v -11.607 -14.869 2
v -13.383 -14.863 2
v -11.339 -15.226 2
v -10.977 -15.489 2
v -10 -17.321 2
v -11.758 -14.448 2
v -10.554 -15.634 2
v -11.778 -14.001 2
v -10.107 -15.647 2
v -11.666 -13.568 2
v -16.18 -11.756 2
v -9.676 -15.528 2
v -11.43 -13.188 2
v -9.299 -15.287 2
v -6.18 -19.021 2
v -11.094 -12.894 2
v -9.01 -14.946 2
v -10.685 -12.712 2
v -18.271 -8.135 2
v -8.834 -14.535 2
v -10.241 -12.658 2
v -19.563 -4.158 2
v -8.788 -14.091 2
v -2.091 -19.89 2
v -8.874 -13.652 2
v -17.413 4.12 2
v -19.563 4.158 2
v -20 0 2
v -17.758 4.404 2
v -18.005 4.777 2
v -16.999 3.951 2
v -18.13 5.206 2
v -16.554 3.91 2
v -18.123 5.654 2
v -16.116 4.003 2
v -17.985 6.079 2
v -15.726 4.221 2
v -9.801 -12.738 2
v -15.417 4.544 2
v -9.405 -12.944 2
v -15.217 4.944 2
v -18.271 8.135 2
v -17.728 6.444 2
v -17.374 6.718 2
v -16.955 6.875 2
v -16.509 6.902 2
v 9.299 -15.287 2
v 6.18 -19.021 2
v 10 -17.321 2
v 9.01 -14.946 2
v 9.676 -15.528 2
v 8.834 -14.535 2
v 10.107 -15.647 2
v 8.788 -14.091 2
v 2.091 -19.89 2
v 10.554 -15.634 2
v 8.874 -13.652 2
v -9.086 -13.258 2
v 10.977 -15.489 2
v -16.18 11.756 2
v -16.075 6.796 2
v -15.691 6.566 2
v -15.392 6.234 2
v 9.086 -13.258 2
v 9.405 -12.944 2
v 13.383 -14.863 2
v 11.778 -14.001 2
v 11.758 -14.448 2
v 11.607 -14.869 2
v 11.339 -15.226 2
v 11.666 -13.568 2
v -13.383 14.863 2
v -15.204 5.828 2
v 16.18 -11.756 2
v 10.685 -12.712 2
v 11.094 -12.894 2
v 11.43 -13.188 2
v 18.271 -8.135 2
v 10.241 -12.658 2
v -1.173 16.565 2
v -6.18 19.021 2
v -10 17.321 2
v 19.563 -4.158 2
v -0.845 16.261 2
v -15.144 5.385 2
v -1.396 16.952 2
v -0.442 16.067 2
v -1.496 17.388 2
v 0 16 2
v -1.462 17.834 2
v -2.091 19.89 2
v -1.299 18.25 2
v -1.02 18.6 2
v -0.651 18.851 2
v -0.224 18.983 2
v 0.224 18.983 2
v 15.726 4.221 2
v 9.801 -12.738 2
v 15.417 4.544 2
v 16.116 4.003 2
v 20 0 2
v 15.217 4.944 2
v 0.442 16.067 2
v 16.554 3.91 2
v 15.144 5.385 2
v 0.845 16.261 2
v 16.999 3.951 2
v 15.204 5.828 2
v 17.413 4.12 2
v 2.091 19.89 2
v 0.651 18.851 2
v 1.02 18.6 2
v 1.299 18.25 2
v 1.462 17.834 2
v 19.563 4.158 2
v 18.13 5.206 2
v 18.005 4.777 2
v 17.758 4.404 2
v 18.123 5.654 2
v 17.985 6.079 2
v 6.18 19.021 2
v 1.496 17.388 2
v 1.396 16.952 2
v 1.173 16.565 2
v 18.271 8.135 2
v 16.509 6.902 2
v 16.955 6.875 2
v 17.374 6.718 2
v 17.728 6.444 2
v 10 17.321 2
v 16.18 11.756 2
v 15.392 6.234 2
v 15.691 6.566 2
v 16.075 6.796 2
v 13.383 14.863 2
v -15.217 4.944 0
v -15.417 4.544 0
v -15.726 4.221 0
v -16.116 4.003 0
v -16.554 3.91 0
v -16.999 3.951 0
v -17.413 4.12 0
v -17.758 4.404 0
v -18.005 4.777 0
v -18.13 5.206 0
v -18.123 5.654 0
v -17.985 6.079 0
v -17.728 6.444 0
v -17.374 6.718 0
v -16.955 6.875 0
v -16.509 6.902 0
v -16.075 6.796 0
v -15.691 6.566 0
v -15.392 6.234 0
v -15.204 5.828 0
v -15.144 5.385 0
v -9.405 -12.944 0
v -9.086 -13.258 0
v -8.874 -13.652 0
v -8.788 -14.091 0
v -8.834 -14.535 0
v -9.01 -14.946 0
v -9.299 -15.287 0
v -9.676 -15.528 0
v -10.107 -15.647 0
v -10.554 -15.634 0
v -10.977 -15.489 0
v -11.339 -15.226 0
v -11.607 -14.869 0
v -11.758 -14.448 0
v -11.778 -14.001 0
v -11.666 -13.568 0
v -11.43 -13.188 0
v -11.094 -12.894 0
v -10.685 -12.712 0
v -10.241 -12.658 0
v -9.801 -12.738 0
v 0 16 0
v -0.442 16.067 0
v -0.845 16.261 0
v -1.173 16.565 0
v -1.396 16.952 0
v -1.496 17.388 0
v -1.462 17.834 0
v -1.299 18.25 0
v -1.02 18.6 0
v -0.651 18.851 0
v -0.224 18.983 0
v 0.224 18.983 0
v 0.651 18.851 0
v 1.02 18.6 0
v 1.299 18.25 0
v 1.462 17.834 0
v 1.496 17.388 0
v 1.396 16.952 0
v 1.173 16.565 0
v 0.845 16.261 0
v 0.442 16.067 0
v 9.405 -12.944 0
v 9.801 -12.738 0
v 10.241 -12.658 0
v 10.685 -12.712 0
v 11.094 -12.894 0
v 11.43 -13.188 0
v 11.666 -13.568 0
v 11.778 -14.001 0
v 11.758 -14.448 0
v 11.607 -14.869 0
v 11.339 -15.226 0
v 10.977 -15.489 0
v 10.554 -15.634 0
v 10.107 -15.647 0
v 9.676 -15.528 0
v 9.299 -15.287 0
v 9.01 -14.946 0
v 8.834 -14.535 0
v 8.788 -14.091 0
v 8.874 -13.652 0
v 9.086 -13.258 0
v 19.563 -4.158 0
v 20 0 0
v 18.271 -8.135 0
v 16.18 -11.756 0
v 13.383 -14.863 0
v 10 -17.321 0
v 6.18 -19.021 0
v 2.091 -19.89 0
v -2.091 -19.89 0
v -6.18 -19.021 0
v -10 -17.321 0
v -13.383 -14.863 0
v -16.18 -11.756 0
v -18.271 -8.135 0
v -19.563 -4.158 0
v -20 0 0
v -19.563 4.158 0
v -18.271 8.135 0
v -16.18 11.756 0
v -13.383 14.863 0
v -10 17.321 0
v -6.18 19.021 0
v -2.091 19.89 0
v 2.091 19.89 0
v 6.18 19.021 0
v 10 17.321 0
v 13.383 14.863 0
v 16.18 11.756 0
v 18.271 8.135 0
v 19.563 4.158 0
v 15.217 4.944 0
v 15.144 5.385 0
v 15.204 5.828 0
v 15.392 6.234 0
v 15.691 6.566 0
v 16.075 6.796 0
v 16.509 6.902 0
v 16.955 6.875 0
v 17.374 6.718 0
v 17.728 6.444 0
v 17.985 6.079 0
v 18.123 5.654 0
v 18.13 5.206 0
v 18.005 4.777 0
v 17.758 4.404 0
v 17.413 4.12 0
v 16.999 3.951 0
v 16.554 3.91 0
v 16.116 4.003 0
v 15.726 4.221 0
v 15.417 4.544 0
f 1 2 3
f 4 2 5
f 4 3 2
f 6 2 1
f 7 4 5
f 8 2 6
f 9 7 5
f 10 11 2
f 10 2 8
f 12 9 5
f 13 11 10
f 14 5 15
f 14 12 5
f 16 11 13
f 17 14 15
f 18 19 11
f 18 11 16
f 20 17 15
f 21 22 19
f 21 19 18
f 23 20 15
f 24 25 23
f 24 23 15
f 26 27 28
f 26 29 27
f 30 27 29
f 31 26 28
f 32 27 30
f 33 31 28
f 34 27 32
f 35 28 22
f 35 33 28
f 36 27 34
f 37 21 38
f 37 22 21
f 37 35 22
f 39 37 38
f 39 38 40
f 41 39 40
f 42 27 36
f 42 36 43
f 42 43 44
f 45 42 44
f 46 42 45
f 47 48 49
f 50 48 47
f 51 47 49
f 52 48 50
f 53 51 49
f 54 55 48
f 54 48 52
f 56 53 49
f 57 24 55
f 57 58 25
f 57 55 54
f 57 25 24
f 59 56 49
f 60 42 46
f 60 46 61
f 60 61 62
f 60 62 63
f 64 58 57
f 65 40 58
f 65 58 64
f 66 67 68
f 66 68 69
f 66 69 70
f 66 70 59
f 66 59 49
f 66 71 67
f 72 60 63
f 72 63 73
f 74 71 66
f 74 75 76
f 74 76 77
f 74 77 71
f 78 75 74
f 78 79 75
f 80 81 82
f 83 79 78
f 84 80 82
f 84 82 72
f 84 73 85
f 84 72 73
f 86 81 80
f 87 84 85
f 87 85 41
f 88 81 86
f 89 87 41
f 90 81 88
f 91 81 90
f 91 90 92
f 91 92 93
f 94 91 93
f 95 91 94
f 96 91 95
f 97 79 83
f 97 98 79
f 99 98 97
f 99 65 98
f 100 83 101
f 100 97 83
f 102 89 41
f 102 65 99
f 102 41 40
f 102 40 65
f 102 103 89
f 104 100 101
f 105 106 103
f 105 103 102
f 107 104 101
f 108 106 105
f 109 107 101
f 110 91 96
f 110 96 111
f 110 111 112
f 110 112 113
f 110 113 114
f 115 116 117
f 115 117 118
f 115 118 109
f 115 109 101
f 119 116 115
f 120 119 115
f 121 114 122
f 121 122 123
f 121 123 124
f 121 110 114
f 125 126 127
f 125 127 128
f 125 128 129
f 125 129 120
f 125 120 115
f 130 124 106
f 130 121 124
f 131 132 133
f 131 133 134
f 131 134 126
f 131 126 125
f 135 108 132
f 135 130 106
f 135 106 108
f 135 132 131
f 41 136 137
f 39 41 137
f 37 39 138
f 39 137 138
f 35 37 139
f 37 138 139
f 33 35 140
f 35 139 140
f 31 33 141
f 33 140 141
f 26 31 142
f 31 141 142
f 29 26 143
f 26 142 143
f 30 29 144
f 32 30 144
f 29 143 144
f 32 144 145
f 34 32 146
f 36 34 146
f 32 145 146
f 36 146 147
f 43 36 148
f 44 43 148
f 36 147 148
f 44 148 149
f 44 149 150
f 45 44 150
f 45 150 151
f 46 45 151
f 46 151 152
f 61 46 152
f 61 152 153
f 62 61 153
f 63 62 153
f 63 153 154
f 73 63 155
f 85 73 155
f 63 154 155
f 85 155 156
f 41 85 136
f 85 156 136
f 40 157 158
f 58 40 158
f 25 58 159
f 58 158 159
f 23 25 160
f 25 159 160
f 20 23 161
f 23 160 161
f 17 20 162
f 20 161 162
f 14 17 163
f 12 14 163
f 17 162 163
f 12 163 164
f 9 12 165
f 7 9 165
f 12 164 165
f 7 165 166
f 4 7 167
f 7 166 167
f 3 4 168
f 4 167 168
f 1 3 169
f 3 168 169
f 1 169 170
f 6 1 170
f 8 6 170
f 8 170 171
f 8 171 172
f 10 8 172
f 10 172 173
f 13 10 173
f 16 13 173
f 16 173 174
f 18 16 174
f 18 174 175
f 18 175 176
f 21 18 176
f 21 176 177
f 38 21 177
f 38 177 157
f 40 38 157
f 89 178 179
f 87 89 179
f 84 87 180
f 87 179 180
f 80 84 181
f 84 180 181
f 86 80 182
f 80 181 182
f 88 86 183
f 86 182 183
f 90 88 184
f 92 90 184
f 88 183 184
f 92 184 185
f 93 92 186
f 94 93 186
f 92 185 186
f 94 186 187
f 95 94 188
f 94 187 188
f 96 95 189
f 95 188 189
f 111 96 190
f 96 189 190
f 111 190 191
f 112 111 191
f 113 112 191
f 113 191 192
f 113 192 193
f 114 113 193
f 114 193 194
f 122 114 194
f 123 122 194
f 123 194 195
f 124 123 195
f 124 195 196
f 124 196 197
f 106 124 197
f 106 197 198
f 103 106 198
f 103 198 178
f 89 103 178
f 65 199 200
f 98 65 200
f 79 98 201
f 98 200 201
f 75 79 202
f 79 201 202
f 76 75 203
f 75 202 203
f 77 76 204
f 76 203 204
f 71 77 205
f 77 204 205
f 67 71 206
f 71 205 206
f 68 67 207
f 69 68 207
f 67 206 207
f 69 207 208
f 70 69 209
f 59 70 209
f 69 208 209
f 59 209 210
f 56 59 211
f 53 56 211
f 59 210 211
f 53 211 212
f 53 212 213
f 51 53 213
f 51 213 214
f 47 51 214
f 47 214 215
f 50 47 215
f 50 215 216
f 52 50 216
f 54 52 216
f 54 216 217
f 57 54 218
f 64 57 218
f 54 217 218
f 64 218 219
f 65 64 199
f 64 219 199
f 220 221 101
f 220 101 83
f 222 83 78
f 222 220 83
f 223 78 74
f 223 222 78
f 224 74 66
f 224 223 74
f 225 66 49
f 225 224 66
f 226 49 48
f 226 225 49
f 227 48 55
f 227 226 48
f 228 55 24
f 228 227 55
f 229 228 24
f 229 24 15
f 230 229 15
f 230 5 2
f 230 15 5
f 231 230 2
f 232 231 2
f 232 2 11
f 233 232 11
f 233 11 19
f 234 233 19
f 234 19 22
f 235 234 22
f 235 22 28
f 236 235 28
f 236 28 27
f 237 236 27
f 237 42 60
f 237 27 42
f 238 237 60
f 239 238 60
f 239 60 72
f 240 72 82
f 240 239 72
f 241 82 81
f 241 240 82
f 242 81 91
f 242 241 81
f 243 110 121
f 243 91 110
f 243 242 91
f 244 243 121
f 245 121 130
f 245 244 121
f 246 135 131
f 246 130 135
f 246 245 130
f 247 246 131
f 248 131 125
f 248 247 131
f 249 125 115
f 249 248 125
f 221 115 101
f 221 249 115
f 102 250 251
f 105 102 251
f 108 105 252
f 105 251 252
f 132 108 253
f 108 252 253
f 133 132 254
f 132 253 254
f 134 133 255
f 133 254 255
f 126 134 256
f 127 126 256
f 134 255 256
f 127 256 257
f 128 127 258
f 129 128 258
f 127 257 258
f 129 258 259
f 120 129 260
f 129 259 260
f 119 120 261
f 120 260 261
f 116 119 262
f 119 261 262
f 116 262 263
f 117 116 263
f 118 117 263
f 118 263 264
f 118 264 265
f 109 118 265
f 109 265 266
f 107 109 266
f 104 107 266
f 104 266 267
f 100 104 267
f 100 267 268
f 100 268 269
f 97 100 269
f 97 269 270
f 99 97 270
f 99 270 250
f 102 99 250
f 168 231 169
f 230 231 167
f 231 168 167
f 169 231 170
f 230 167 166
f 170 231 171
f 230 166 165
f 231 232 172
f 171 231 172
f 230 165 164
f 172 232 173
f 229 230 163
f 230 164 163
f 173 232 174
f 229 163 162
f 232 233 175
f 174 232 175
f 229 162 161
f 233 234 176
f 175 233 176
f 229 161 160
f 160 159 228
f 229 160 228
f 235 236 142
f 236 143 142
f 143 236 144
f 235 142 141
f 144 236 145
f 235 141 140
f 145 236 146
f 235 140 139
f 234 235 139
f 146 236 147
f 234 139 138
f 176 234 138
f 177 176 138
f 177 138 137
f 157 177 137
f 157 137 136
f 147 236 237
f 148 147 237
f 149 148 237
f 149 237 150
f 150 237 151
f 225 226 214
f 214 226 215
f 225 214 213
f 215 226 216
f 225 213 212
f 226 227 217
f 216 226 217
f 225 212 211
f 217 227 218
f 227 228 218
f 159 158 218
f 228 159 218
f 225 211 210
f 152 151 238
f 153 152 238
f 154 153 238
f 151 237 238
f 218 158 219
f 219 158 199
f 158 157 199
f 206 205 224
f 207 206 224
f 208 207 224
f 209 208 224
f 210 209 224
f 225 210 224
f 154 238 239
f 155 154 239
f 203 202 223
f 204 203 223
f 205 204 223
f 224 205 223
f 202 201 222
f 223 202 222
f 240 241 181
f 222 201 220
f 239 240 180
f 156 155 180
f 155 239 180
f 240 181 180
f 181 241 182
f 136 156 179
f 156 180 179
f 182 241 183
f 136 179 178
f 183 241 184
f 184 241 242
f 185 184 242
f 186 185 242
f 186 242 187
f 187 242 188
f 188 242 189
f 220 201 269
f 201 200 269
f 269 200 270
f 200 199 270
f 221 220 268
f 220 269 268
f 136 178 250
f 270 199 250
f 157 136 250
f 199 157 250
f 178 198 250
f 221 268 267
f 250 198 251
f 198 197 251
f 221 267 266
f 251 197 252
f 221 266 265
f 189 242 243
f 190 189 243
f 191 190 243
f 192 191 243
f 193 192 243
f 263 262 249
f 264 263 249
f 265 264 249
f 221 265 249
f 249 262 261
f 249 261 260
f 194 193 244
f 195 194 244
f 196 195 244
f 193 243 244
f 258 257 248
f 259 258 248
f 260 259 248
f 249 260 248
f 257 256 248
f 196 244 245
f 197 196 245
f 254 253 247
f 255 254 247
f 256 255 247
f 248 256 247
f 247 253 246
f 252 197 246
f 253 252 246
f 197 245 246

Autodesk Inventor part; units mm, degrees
ref_plane "YZ Plane" through (0, 0, 0) normal (1, 0, 0) x (0, 1, 0)
ref_plane "XZ Plane" through (0, 0, 0) normal (0, 1, 0) x (-1, 0, 0)
ref_plane "XY Plane" through (0, 0, 0) normal (0, 0, 1) x (1, 0, 0)
sketch "Sketch1" plane through (0, 0, 0) normal (0, 0, 1) x (1, 0, 0)
  circle A0 centre (0, 0) radius 20
  dimension "d0" = 40
extrude "Extrusion1" add sketch "Sketch1" along normal blind 2
sketch "Sketch2" plane through (0, 0, 2) normal (0, 0, 1) x (1, 0, 0)
  circle A0 centre (0, 0) radius 17.5 construction
  point P0 (0, 17.5)
  dimension "d3" = 35
hole "Hole1" at (0, 17.5, 2) direction (0, 0, -1) diameter 3 depth 2
pattern_circular "Circular Pattern1" count 5 over 360 about axis through (0, 0, 0) along (0, 0, 1) of "Hole1"
properties part number "35" material "Copper, Alloy"
